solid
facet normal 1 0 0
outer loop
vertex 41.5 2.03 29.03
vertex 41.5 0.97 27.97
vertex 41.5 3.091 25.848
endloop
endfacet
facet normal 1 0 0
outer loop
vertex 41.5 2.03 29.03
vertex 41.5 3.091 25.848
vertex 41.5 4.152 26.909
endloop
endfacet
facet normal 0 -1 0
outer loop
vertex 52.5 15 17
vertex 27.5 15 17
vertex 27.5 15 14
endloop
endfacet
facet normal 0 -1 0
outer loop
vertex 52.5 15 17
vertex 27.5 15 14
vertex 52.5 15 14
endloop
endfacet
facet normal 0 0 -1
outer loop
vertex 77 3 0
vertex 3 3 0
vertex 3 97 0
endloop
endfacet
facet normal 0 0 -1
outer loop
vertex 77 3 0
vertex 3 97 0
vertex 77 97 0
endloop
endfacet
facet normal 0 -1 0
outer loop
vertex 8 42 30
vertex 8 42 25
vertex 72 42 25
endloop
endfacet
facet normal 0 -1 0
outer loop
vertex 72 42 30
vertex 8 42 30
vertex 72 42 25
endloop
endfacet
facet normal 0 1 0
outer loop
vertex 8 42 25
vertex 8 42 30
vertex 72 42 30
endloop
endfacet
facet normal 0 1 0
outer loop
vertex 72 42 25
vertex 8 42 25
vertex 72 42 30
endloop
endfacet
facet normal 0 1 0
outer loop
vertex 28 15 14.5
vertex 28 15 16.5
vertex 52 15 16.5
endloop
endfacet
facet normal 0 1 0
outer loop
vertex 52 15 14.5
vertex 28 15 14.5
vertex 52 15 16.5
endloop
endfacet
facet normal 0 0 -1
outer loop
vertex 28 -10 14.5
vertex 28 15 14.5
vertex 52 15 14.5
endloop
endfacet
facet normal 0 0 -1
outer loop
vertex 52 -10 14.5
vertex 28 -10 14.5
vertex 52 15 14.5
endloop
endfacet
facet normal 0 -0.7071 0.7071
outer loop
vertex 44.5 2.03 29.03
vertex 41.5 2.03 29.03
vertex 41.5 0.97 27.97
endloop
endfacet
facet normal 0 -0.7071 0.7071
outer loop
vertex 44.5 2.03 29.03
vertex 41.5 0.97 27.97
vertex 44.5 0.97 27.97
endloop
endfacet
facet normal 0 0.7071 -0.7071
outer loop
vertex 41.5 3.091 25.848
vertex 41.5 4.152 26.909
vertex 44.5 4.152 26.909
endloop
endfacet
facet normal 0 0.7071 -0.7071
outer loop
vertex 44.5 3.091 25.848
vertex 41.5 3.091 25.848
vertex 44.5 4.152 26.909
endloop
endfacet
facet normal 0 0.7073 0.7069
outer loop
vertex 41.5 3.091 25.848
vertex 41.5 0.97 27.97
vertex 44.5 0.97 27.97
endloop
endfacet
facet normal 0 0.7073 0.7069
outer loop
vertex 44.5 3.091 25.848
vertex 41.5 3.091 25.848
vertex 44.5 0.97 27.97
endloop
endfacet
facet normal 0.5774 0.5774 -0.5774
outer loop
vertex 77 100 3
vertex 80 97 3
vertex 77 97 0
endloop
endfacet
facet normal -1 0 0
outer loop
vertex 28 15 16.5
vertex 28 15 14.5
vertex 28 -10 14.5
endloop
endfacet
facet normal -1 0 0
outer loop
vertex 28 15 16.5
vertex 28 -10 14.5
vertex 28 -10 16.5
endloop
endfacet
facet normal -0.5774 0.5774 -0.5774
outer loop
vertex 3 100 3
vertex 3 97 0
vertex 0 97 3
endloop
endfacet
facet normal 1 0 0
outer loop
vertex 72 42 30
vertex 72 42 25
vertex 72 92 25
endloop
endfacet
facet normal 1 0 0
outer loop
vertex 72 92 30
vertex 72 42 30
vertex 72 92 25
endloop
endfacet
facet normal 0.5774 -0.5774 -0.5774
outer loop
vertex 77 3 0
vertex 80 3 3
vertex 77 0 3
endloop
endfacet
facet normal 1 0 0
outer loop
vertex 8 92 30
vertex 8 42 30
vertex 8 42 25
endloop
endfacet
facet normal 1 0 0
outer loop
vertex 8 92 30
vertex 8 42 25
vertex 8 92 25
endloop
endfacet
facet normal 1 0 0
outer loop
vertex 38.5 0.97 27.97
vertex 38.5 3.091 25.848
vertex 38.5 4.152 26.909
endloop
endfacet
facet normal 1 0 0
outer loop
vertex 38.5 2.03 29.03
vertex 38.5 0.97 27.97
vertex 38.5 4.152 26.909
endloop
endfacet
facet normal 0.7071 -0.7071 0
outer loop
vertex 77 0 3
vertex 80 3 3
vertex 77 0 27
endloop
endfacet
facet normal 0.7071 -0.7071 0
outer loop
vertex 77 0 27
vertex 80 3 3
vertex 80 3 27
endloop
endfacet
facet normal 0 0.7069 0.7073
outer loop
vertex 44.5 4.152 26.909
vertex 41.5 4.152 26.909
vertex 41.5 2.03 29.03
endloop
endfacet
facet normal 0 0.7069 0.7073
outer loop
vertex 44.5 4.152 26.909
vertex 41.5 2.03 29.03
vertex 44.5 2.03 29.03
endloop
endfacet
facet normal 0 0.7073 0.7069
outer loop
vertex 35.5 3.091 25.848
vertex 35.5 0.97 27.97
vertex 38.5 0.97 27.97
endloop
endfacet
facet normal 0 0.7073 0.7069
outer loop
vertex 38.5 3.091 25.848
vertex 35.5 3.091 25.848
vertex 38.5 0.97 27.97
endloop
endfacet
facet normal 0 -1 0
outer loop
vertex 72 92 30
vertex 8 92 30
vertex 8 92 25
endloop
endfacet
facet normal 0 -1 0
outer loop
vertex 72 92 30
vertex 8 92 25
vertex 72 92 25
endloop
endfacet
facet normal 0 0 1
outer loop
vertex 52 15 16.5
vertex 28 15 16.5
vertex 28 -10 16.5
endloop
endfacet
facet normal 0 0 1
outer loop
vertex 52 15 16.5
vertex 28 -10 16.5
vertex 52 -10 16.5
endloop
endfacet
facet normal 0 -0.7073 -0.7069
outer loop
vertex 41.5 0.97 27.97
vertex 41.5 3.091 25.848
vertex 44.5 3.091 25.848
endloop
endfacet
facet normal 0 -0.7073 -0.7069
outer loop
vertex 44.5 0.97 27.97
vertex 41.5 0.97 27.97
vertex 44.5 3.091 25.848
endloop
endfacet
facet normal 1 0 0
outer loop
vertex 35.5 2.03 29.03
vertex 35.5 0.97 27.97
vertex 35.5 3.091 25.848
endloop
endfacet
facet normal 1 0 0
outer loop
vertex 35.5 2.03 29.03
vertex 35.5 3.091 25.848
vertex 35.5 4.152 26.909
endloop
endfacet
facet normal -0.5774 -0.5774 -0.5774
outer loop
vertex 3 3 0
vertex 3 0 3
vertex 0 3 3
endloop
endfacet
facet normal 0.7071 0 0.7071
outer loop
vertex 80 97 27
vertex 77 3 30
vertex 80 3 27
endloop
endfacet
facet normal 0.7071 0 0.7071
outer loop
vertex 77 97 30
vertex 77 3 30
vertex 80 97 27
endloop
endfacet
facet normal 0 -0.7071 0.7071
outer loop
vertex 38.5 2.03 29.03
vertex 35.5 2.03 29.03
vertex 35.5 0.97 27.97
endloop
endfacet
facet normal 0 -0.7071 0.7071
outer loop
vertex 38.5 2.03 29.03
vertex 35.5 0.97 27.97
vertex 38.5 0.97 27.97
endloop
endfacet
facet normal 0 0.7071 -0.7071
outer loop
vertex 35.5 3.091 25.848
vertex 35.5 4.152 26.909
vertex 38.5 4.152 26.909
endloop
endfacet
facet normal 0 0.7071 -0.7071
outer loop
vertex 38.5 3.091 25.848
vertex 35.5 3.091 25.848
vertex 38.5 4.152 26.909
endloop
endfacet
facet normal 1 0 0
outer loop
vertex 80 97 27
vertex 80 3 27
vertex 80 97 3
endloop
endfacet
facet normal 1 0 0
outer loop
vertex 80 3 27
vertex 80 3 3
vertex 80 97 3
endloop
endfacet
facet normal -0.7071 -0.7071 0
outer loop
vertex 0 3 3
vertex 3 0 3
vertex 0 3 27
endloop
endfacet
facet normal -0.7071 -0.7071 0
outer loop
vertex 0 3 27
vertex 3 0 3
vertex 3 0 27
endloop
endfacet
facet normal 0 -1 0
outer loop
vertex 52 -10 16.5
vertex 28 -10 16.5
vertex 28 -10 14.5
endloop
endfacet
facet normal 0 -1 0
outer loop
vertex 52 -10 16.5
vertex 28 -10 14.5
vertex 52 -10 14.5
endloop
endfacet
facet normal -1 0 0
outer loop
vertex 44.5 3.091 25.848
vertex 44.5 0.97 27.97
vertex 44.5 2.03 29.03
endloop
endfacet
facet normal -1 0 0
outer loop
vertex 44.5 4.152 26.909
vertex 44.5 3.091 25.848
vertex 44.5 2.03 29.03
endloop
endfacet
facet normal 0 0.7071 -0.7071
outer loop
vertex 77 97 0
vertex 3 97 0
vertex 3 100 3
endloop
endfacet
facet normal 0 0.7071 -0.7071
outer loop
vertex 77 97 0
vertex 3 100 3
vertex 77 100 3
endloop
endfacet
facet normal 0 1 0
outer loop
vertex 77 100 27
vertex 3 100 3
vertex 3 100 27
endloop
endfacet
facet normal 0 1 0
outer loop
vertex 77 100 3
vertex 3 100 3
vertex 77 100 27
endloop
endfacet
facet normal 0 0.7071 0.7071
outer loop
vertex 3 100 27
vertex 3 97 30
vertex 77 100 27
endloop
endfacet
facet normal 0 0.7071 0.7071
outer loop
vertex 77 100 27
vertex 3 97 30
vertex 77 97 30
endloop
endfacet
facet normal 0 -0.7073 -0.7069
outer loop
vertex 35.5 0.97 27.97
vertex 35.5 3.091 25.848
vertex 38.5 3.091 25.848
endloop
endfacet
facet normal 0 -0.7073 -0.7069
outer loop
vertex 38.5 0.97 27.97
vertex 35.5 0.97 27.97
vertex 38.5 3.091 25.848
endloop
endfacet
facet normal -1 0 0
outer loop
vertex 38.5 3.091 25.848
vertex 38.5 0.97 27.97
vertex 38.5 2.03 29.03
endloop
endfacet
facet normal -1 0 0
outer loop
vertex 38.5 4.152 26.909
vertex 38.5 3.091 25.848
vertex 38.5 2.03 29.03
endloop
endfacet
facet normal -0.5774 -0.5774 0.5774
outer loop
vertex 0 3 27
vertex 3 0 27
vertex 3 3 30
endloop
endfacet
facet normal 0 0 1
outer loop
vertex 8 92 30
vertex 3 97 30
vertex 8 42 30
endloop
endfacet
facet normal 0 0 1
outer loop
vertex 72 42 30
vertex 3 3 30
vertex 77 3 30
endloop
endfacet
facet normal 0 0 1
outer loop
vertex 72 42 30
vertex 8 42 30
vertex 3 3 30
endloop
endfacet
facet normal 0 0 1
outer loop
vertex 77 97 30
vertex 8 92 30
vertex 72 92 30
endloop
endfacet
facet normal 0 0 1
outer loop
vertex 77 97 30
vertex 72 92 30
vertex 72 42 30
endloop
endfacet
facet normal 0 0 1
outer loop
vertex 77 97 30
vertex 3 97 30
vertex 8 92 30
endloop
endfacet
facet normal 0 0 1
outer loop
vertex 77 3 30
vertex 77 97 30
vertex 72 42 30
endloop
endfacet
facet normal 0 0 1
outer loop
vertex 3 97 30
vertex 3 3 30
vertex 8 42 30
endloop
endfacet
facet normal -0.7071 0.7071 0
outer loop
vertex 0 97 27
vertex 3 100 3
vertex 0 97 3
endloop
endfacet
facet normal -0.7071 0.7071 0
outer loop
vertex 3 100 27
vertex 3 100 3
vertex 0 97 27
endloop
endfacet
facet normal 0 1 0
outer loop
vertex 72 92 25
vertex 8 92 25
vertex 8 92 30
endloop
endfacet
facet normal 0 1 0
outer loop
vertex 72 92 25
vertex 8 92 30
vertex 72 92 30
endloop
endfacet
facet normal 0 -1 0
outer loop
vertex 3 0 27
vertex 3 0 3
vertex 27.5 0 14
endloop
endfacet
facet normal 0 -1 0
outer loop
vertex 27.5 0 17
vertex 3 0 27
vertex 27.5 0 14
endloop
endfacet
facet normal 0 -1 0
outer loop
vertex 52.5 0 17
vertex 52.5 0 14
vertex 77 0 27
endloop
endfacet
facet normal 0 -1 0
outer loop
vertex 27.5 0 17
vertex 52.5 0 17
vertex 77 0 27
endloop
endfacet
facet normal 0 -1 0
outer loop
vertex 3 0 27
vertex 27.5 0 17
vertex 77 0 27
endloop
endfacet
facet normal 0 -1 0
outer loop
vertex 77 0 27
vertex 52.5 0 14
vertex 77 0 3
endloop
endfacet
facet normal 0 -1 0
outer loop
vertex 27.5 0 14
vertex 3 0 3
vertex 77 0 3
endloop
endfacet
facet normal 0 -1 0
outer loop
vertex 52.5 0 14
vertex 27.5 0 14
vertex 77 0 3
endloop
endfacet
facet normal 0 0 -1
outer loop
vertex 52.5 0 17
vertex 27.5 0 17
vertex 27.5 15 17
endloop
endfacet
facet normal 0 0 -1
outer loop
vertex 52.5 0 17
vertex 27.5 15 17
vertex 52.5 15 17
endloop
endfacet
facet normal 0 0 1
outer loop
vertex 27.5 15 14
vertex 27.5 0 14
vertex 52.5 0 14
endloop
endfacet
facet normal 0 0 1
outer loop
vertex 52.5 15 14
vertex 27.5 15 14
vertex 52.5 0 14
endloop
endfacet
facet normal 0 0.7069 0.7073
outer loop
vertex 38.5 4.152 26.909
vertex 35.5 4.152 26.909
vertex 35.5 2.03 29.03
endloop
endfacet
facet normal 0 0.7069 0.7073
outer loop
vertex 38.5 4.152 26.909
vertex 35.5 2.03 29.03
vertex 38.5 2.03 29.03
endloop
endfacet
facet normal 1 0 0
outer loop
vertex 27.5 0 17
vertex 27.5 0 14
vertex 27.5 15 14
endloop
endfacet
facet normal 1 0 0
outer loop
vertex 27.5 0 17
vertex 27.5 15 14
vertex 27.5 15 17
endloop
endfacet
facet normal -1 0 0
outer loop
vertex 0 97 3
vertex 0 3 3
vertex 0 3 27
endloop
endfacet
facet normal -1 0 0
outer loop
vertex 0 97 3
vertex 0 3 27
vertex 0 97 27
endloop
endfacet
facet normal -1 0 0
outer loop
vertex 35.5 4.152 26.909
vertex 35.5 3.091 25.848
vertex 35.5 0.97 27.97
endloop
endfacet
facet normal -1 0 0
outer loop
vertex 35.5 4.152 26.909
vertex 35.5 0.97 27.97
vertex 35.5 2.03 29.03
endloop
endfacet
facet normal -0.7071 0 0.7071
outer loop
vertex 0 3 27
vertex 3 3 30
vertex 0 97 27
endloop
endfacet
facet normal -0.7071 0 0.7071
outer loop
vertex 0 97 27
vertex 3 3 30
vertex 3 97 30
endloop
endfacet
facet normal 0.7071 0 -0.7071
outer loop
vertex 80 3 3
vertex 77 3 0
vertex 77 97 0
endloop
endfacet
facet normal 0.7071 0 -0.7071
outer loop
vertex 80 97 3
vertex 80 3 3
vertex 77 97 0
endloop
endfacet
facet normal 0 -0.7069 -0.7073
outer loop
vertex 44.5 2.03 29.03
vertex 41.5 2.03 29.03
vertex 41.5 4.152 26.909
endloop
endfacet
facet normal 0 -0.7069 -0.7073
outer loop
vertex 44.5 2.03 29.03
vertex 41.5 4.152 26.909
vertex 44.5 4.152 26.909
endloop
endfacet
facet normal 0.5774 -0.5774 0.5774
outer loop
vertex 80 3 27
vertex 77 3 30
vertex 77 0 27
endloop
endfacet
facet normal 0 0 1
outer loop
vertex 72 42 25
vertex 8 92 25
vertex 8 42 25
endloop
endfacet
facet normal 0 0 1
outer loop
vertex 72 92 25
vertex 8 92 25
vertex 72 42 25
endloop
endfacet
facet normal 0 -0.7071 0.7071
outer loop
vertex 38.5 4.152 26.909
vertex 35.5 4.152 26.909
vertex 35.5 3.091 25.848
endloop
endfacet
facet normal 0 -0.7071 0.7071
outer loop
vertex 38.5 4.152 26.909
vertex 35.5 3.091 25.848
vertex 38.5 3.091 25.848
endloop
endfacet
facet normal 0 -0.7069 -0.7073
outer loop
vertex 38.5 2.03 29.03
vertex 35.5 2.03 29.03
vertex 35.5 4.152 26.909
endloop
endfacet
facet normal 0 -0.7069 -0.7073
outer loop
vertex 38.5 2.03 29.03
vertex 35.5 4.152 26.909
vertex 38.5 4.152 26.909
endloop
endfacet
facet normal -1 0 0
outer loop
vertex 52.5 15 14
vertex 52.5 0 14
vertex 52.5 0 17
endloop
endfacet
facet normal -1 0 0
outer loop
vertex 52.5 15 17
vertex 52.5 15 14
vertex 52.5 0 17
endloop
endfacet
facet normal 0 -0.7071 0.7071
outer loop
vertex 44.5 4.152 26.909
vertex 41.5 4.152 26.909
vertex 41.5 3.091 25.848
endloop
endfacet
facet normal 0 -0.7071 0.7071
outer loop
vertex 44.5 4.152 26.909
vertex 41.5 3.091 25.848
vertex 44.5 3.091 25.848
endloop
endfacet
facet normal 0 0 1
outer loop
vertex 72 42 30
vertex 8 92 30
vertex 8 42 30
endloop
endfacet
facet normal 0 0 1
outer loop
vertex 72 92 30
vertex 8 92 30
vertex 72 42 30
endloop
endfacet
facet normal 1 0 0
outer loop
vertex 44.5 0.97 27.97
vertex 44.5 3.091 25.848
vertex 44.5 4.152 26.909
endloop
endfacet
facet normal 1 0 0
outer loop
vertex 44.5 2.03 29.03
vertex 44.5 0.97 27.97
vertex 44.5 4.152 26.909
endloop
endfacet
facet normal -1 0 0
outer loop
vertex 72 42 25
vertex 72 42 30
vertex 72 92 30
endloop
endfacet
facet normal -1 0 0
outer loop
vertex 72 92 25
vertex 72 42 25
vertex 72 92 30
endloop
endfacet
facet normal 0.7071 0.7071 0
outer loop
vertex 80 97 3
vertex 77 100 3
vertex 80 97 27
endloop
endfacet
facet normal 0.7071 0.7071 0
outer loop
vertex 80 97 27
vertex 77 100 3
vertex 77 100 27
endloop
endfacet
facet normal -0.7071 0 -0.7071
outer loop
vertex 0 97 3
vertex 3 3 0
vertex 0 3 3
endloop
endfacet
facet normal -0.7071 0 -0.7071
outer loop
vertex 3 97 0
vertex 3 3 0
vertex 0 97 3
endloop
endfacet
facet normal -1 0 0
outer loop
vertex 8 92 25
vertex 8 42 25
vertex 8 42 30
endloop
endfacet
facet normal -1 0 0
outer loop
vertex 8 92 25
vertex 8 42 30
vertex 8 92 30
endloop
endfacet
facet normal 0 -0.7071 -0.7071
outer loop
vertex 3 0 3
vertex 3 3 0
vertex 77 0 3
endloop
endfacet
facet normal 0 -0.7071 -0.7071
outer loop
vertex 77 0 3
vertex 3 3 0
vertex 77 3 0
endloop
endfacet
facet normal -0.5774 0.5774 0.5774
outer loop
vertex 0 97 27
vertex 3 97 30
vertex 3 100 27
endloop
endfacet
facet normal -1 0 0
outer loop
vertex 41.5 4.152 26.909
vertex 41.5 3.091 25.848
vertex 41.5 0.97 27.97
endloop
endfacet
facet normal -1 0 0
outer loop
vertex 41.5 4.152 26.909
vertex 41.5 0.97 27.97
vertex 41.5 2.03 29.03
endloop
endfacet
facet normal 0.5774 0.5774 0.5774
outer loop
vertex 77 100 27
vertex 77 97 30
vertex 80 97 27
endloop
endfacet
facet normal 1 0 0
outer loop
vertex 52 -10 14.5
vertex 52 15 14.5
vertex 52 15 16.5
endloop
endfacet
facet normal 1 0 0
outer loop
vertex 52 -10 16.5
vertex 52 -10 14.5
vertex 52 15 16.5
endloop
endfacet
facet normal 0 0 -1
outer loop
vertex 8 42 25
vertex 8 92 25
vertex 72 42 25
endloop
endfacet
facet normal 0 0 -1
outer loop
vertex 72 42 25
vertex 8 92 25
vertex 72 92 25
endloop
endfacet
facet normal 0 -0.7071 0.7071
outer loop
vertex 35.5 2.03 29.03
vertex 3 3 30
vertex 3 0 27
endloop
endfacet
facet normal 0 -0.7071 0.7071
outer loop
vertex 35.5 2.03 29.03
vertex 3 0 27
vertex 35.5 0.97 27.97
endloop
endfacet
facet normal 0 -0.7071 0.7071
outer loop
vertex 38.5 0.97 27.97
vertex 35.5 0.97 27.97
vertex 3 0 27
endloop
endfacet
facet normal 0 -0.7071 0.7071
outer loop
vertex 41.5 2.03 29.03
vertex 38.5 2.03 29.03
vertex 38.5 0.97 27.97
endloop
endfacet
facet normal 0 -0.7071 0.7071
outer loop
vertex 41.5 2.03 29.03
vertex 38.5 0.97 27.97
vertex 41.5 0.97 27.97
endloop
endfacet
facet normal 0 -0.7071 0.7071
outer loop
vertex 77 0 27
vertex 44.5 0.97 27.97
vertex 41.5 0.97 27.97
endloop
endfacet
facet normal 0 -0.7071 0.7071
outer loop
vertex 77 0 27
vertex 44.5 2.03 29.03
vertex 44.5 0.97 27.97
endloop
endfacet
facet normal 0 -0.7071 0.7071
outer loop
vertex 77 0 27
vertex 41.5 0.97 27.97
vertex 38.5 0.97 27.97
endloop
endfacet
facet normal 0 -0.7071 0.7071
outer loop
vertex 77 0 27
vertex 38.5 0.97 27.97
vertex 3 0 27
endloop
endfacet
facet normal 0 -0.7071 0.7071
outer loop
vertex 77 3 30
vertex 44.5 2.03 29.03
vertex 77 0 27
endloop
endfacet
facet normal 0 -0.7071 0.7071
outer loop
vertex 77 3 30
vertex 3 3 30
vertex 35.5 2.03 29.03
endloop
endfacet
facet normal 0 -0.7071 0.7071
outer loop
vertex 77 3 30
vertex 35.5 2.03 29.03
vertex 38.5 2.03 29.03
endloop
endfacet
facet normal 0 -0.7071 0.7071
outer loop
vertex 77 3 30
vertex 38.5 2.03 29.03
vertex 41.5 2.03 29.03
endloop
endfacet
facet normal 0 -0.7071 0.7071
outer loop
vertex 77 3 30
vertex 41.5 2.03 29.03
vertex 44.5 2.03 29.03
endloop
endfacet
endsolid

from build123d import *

# Parameters (mm, degrees)
F0_W      = 80
F0_H      = 100
F1_DEPTH  = 30
F2_SIZE   = 3
F3_W      = 64
F3_H      = 50
F4_DEPTH  = 5
F5_W      = 25
F5_H      = 3
F6_DEPTH  = 15
F7_W      = 3
F7_H      = 1.5
F8_DEPTH  = 3
F4_FACE_W = 64
F4_FACE_H = 50
F9_DEPTH  = 5
F8_FACE_W = 3
F8_FACE_H = 1.5
F10_DEPTH = 3
F11_W     = 24
F11_H     = 2
F12_DEPTH = 25


with BuildPart() as f1:
    # F0 (on Top) → F1 (new body)
    with BuildSketch(Plane.XY):
        with Locations((40, 50)):
            Rectangle(F0_W, F0_H)
    extrude(amount=F1_DEPTH)

    # F2
    f2_edges = [f1.edges().sort_by_distance(p)[0] for p in [
        (40, 0, 30),
        (80, 50, 30),
        (80, 0, 15),
        (0, 0, 15),
        (0, 50, 30),
        (40, 100, 30),
        (80, 100, 15),
        (80, 50, 0),
        (40, 0, 0),
        (0, 50, 0),
        (40, 100, 0),
        (0, 100, 15),
    ]]
    chamfer(f2_edges, length=F2_SIZE)

    # F3 (on face) → F4 (cut)
    with BuildSketch(Plane.XY.offset(30)):
        with Locations((40, 67)):
            Rectangle(F3_W, F3_H)
    extrude(amount=-F4_DEPTH, mode=Mode.SUBTRACT)

    # F5 (on face) → F6 (cut)
    with BuildSketch(Plane.XZ):
        with Locations((40, 15.5)):
            Rectangle(F5_W, F5_H)
    extrude(amount=-F6_DEPTH, mode=Mode.SUBTRACT)

    # F7 (on face) → F8 (cut)
    with BuildSketch(Plane(origin=(0, -13.5, 13.5), x_dir=(1, 0, 0), z_dir=(0, -0.707107, 0.707107))):
        with Locations((37, 21.213203)):
            Rectangle(F7_W, F7_H)
        with Locations((43, 21.213203)):
            Rectangle(F7_W, F7_H)
    extrude(amount=-F8_DEPTH, mode=Mode.SUBTRACT)


with BuildPart() as f9:
    # F4_face (on face) → F9 (new body)
    with BuildSketch(Plane(origin=(40, 67, 25), x_dir=(1, 0, 0), z_dir=(0, 0, 1))):
        Rectangle(F4_FACE_W, F4_FACE_H)
    extrude(amount=F9_DEPTH)


with BuildPart() as f10:
    # F8_face (on face) → F10 (new body)
    with BuildSketch(Plane(origin=(37, 3.62132, 26.37868), x_dir=(1, 0, 0), z_dir=(0, -0.707107, 0.707107))):
        Rectangle(F8_FACE_W, F8_FACE_H)
        with Locations((6, 0)):
            Rectangle(F8_FACE_W, F8_FACE_H)
    extrude(amount=F10_DEPTH)


with BuildPart() as f12:
    # F11 (on face) → F12 (new body)
    with BuildSketch(Plane.XZ.offset(-15)):
        with Locations((40, 15.5)):
            Rectangle(F11_W, F11_H)
    extrude(amount=F12_DEPTH)


solid = Compound([f1.part, f9.part, f10.part, f12.part])
